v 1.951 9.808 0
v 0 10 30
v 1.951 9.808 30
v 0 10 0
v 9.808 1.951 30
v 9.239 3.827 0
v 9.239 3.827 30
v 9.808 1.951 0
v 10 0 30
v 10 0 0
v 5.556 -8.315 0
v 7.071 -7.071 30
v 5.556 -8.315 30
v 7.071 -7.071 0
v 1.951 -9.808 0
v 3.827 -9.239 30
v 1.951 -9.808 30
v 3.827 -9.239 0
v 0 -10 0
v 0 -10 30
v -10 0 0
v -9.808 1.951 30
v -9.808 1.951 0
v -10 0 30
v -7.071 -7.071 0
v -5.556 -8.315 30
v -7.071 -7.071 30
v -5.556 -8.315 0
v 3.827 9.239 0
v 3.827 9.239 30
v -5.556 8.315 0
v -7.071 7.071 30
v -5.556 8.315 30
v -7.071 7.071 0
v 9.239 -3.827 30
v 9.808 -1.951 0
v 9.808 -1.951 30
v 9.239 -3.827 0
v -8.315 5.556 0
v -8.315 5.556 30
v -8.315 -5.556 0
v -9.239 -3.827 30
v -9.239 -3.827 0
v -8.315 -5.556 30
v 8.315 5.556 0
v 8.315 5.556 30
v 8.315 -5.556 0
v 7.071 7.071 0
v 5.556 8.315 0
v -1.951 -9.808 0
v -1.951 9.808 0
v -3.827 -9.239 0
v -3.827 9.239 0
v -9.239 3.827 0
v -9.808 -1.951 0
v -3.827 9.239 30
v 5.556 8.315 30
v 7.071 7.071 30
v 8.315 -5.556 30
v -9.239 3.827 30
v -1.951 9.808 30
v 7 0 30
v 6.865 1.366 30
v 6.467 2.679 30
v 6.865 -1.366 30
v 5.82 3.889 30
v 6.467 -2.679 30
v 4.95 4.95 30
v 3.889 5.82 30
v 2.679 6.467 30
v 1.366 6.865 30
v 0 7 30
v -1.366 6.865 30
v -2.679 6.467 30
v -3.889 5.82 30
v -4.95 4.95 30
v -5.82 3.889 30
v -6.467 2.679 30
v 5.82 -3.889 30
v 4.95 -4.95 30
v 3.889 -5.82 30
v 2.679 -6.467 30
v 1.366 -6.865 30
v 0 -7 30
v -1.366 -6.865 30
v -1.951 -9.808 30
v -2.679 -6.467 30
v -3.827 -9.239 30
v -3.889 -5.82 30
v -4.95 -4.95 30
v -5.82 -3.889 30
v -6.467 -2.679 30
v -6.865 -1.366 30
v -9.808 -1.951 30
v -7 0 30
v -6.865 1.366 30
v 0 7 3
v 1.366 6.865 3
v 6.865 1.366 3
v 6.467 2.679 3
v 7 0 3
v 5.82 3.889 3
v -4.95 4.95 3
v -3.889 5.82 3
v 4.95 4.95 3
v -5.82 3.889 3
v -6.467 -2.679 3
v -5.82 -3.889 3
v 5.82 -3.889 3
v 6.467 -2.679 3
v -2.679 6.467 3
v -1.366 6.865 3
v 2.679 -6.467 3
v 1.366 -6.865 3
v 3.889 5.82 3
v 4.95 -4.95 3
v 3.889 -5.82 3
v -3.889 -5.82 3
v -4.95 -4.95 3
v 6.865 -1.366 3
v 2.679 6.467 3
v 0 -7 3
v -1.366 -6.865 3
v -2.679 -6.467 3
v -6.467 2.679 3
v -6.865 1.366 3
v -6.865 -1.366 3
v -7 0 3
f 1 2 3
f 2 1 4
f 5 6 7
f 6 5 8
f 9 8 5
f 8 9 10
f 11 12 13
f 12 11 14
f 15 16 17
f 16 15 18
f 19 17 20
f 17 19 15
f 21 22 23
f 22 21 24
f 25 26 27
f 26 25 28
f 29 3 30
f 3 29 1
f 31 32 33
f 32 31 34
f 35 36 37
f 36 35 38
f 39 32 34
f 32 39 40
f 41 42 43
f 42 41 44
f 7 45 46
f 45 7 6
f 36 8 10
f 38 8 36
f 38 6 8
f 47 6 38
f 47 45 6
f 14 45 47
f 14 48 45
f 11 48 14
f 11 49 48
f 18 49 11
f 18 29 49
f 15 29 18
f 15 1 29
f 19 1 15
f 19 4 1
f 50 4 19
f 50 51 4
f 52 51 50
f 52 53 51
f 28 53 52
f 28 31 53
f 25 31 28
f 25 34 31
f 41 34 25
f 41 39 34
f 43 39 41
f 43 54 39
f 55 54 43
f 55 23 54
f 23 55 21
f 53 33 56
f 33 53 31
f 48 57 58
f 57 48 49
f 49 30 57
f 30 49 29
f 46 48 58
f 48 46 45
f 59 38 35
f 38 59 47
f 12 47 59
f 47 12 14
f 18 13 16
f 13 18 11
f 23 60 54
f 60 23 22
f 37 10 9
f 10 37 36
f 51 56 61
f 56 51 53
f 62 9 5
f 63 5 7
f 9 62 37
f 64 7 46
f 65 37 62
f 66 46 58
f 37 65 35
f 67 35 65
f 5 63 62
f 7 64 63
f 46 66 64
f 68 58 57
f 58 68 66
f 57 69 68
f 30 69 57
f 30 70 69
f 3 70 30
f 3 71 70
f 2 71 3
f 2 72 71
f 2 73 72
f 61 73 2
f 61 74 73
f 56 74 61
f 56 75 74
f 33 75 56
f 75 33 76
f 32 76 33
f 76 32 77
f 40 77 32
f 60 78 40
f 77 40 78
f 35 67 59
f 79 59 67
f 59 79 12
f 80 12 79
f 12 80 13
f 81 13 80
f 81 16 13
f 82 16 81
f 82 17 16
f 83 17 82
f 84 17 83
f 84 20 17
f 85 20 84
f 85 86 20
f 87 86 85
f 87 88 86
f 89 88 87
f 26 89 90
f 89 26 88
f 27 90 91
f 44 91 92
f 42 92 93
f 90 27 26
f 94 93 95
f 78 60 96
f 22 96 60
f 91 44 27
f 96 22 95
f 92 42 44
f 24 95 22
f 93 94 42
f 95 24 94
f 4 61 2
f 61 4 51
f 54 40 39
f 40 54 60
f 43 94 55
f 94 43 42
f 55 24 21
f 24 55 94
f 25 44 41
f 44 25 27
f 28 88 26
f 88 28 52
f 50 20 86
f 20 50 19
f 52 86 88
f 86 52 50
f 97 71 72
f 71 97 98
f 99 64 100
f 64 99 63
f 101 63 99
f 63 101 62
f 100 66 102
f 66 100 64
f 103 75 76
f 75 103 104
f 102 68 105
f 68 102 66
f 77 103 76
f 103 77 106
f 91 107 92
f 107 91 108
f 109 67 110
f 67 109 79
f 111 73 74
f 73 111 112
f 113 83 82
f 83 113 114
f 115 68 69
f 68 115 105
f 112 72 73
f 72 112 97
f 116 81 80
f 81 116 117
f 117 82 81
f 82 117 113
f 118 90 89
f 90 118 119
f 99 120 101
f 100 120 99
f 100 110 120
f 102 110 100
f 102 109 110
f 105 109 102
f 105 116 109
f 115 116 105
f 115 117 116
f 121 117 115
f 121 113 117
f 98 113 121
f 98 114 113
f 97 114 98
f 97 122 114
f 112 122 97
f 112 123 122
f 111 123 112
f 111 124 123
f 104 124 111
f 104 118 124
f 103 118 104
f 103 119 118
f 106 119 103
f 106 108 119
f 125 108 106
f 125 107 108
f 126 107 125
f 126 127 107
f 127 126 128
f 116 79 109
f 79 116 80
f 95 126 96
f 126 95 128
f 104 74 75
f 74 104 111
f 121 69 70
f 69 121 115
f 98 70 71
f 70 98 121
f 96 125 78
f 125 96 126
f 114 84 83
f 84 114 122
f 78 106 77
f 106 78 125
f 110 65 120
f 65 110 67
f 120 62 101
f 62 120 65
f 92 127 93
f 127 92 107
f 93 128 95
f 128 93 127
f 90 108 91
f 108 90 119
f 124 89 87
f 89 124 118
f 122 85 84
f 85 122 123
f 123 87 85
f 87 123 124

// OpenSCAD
// Options
outerRadius = 10;
innerRadius = 7;
length = 30;
floorThickness = 3;

// Tube
difference()
{
    cylinder(length, outerRadius, outerRadius, center=false, $fn = 32);        
    translate([0, 0, floorThickness])
    {
        cylinder(length, innerRadius, innerRadius, center=false, $fn = 32);
    }
}
